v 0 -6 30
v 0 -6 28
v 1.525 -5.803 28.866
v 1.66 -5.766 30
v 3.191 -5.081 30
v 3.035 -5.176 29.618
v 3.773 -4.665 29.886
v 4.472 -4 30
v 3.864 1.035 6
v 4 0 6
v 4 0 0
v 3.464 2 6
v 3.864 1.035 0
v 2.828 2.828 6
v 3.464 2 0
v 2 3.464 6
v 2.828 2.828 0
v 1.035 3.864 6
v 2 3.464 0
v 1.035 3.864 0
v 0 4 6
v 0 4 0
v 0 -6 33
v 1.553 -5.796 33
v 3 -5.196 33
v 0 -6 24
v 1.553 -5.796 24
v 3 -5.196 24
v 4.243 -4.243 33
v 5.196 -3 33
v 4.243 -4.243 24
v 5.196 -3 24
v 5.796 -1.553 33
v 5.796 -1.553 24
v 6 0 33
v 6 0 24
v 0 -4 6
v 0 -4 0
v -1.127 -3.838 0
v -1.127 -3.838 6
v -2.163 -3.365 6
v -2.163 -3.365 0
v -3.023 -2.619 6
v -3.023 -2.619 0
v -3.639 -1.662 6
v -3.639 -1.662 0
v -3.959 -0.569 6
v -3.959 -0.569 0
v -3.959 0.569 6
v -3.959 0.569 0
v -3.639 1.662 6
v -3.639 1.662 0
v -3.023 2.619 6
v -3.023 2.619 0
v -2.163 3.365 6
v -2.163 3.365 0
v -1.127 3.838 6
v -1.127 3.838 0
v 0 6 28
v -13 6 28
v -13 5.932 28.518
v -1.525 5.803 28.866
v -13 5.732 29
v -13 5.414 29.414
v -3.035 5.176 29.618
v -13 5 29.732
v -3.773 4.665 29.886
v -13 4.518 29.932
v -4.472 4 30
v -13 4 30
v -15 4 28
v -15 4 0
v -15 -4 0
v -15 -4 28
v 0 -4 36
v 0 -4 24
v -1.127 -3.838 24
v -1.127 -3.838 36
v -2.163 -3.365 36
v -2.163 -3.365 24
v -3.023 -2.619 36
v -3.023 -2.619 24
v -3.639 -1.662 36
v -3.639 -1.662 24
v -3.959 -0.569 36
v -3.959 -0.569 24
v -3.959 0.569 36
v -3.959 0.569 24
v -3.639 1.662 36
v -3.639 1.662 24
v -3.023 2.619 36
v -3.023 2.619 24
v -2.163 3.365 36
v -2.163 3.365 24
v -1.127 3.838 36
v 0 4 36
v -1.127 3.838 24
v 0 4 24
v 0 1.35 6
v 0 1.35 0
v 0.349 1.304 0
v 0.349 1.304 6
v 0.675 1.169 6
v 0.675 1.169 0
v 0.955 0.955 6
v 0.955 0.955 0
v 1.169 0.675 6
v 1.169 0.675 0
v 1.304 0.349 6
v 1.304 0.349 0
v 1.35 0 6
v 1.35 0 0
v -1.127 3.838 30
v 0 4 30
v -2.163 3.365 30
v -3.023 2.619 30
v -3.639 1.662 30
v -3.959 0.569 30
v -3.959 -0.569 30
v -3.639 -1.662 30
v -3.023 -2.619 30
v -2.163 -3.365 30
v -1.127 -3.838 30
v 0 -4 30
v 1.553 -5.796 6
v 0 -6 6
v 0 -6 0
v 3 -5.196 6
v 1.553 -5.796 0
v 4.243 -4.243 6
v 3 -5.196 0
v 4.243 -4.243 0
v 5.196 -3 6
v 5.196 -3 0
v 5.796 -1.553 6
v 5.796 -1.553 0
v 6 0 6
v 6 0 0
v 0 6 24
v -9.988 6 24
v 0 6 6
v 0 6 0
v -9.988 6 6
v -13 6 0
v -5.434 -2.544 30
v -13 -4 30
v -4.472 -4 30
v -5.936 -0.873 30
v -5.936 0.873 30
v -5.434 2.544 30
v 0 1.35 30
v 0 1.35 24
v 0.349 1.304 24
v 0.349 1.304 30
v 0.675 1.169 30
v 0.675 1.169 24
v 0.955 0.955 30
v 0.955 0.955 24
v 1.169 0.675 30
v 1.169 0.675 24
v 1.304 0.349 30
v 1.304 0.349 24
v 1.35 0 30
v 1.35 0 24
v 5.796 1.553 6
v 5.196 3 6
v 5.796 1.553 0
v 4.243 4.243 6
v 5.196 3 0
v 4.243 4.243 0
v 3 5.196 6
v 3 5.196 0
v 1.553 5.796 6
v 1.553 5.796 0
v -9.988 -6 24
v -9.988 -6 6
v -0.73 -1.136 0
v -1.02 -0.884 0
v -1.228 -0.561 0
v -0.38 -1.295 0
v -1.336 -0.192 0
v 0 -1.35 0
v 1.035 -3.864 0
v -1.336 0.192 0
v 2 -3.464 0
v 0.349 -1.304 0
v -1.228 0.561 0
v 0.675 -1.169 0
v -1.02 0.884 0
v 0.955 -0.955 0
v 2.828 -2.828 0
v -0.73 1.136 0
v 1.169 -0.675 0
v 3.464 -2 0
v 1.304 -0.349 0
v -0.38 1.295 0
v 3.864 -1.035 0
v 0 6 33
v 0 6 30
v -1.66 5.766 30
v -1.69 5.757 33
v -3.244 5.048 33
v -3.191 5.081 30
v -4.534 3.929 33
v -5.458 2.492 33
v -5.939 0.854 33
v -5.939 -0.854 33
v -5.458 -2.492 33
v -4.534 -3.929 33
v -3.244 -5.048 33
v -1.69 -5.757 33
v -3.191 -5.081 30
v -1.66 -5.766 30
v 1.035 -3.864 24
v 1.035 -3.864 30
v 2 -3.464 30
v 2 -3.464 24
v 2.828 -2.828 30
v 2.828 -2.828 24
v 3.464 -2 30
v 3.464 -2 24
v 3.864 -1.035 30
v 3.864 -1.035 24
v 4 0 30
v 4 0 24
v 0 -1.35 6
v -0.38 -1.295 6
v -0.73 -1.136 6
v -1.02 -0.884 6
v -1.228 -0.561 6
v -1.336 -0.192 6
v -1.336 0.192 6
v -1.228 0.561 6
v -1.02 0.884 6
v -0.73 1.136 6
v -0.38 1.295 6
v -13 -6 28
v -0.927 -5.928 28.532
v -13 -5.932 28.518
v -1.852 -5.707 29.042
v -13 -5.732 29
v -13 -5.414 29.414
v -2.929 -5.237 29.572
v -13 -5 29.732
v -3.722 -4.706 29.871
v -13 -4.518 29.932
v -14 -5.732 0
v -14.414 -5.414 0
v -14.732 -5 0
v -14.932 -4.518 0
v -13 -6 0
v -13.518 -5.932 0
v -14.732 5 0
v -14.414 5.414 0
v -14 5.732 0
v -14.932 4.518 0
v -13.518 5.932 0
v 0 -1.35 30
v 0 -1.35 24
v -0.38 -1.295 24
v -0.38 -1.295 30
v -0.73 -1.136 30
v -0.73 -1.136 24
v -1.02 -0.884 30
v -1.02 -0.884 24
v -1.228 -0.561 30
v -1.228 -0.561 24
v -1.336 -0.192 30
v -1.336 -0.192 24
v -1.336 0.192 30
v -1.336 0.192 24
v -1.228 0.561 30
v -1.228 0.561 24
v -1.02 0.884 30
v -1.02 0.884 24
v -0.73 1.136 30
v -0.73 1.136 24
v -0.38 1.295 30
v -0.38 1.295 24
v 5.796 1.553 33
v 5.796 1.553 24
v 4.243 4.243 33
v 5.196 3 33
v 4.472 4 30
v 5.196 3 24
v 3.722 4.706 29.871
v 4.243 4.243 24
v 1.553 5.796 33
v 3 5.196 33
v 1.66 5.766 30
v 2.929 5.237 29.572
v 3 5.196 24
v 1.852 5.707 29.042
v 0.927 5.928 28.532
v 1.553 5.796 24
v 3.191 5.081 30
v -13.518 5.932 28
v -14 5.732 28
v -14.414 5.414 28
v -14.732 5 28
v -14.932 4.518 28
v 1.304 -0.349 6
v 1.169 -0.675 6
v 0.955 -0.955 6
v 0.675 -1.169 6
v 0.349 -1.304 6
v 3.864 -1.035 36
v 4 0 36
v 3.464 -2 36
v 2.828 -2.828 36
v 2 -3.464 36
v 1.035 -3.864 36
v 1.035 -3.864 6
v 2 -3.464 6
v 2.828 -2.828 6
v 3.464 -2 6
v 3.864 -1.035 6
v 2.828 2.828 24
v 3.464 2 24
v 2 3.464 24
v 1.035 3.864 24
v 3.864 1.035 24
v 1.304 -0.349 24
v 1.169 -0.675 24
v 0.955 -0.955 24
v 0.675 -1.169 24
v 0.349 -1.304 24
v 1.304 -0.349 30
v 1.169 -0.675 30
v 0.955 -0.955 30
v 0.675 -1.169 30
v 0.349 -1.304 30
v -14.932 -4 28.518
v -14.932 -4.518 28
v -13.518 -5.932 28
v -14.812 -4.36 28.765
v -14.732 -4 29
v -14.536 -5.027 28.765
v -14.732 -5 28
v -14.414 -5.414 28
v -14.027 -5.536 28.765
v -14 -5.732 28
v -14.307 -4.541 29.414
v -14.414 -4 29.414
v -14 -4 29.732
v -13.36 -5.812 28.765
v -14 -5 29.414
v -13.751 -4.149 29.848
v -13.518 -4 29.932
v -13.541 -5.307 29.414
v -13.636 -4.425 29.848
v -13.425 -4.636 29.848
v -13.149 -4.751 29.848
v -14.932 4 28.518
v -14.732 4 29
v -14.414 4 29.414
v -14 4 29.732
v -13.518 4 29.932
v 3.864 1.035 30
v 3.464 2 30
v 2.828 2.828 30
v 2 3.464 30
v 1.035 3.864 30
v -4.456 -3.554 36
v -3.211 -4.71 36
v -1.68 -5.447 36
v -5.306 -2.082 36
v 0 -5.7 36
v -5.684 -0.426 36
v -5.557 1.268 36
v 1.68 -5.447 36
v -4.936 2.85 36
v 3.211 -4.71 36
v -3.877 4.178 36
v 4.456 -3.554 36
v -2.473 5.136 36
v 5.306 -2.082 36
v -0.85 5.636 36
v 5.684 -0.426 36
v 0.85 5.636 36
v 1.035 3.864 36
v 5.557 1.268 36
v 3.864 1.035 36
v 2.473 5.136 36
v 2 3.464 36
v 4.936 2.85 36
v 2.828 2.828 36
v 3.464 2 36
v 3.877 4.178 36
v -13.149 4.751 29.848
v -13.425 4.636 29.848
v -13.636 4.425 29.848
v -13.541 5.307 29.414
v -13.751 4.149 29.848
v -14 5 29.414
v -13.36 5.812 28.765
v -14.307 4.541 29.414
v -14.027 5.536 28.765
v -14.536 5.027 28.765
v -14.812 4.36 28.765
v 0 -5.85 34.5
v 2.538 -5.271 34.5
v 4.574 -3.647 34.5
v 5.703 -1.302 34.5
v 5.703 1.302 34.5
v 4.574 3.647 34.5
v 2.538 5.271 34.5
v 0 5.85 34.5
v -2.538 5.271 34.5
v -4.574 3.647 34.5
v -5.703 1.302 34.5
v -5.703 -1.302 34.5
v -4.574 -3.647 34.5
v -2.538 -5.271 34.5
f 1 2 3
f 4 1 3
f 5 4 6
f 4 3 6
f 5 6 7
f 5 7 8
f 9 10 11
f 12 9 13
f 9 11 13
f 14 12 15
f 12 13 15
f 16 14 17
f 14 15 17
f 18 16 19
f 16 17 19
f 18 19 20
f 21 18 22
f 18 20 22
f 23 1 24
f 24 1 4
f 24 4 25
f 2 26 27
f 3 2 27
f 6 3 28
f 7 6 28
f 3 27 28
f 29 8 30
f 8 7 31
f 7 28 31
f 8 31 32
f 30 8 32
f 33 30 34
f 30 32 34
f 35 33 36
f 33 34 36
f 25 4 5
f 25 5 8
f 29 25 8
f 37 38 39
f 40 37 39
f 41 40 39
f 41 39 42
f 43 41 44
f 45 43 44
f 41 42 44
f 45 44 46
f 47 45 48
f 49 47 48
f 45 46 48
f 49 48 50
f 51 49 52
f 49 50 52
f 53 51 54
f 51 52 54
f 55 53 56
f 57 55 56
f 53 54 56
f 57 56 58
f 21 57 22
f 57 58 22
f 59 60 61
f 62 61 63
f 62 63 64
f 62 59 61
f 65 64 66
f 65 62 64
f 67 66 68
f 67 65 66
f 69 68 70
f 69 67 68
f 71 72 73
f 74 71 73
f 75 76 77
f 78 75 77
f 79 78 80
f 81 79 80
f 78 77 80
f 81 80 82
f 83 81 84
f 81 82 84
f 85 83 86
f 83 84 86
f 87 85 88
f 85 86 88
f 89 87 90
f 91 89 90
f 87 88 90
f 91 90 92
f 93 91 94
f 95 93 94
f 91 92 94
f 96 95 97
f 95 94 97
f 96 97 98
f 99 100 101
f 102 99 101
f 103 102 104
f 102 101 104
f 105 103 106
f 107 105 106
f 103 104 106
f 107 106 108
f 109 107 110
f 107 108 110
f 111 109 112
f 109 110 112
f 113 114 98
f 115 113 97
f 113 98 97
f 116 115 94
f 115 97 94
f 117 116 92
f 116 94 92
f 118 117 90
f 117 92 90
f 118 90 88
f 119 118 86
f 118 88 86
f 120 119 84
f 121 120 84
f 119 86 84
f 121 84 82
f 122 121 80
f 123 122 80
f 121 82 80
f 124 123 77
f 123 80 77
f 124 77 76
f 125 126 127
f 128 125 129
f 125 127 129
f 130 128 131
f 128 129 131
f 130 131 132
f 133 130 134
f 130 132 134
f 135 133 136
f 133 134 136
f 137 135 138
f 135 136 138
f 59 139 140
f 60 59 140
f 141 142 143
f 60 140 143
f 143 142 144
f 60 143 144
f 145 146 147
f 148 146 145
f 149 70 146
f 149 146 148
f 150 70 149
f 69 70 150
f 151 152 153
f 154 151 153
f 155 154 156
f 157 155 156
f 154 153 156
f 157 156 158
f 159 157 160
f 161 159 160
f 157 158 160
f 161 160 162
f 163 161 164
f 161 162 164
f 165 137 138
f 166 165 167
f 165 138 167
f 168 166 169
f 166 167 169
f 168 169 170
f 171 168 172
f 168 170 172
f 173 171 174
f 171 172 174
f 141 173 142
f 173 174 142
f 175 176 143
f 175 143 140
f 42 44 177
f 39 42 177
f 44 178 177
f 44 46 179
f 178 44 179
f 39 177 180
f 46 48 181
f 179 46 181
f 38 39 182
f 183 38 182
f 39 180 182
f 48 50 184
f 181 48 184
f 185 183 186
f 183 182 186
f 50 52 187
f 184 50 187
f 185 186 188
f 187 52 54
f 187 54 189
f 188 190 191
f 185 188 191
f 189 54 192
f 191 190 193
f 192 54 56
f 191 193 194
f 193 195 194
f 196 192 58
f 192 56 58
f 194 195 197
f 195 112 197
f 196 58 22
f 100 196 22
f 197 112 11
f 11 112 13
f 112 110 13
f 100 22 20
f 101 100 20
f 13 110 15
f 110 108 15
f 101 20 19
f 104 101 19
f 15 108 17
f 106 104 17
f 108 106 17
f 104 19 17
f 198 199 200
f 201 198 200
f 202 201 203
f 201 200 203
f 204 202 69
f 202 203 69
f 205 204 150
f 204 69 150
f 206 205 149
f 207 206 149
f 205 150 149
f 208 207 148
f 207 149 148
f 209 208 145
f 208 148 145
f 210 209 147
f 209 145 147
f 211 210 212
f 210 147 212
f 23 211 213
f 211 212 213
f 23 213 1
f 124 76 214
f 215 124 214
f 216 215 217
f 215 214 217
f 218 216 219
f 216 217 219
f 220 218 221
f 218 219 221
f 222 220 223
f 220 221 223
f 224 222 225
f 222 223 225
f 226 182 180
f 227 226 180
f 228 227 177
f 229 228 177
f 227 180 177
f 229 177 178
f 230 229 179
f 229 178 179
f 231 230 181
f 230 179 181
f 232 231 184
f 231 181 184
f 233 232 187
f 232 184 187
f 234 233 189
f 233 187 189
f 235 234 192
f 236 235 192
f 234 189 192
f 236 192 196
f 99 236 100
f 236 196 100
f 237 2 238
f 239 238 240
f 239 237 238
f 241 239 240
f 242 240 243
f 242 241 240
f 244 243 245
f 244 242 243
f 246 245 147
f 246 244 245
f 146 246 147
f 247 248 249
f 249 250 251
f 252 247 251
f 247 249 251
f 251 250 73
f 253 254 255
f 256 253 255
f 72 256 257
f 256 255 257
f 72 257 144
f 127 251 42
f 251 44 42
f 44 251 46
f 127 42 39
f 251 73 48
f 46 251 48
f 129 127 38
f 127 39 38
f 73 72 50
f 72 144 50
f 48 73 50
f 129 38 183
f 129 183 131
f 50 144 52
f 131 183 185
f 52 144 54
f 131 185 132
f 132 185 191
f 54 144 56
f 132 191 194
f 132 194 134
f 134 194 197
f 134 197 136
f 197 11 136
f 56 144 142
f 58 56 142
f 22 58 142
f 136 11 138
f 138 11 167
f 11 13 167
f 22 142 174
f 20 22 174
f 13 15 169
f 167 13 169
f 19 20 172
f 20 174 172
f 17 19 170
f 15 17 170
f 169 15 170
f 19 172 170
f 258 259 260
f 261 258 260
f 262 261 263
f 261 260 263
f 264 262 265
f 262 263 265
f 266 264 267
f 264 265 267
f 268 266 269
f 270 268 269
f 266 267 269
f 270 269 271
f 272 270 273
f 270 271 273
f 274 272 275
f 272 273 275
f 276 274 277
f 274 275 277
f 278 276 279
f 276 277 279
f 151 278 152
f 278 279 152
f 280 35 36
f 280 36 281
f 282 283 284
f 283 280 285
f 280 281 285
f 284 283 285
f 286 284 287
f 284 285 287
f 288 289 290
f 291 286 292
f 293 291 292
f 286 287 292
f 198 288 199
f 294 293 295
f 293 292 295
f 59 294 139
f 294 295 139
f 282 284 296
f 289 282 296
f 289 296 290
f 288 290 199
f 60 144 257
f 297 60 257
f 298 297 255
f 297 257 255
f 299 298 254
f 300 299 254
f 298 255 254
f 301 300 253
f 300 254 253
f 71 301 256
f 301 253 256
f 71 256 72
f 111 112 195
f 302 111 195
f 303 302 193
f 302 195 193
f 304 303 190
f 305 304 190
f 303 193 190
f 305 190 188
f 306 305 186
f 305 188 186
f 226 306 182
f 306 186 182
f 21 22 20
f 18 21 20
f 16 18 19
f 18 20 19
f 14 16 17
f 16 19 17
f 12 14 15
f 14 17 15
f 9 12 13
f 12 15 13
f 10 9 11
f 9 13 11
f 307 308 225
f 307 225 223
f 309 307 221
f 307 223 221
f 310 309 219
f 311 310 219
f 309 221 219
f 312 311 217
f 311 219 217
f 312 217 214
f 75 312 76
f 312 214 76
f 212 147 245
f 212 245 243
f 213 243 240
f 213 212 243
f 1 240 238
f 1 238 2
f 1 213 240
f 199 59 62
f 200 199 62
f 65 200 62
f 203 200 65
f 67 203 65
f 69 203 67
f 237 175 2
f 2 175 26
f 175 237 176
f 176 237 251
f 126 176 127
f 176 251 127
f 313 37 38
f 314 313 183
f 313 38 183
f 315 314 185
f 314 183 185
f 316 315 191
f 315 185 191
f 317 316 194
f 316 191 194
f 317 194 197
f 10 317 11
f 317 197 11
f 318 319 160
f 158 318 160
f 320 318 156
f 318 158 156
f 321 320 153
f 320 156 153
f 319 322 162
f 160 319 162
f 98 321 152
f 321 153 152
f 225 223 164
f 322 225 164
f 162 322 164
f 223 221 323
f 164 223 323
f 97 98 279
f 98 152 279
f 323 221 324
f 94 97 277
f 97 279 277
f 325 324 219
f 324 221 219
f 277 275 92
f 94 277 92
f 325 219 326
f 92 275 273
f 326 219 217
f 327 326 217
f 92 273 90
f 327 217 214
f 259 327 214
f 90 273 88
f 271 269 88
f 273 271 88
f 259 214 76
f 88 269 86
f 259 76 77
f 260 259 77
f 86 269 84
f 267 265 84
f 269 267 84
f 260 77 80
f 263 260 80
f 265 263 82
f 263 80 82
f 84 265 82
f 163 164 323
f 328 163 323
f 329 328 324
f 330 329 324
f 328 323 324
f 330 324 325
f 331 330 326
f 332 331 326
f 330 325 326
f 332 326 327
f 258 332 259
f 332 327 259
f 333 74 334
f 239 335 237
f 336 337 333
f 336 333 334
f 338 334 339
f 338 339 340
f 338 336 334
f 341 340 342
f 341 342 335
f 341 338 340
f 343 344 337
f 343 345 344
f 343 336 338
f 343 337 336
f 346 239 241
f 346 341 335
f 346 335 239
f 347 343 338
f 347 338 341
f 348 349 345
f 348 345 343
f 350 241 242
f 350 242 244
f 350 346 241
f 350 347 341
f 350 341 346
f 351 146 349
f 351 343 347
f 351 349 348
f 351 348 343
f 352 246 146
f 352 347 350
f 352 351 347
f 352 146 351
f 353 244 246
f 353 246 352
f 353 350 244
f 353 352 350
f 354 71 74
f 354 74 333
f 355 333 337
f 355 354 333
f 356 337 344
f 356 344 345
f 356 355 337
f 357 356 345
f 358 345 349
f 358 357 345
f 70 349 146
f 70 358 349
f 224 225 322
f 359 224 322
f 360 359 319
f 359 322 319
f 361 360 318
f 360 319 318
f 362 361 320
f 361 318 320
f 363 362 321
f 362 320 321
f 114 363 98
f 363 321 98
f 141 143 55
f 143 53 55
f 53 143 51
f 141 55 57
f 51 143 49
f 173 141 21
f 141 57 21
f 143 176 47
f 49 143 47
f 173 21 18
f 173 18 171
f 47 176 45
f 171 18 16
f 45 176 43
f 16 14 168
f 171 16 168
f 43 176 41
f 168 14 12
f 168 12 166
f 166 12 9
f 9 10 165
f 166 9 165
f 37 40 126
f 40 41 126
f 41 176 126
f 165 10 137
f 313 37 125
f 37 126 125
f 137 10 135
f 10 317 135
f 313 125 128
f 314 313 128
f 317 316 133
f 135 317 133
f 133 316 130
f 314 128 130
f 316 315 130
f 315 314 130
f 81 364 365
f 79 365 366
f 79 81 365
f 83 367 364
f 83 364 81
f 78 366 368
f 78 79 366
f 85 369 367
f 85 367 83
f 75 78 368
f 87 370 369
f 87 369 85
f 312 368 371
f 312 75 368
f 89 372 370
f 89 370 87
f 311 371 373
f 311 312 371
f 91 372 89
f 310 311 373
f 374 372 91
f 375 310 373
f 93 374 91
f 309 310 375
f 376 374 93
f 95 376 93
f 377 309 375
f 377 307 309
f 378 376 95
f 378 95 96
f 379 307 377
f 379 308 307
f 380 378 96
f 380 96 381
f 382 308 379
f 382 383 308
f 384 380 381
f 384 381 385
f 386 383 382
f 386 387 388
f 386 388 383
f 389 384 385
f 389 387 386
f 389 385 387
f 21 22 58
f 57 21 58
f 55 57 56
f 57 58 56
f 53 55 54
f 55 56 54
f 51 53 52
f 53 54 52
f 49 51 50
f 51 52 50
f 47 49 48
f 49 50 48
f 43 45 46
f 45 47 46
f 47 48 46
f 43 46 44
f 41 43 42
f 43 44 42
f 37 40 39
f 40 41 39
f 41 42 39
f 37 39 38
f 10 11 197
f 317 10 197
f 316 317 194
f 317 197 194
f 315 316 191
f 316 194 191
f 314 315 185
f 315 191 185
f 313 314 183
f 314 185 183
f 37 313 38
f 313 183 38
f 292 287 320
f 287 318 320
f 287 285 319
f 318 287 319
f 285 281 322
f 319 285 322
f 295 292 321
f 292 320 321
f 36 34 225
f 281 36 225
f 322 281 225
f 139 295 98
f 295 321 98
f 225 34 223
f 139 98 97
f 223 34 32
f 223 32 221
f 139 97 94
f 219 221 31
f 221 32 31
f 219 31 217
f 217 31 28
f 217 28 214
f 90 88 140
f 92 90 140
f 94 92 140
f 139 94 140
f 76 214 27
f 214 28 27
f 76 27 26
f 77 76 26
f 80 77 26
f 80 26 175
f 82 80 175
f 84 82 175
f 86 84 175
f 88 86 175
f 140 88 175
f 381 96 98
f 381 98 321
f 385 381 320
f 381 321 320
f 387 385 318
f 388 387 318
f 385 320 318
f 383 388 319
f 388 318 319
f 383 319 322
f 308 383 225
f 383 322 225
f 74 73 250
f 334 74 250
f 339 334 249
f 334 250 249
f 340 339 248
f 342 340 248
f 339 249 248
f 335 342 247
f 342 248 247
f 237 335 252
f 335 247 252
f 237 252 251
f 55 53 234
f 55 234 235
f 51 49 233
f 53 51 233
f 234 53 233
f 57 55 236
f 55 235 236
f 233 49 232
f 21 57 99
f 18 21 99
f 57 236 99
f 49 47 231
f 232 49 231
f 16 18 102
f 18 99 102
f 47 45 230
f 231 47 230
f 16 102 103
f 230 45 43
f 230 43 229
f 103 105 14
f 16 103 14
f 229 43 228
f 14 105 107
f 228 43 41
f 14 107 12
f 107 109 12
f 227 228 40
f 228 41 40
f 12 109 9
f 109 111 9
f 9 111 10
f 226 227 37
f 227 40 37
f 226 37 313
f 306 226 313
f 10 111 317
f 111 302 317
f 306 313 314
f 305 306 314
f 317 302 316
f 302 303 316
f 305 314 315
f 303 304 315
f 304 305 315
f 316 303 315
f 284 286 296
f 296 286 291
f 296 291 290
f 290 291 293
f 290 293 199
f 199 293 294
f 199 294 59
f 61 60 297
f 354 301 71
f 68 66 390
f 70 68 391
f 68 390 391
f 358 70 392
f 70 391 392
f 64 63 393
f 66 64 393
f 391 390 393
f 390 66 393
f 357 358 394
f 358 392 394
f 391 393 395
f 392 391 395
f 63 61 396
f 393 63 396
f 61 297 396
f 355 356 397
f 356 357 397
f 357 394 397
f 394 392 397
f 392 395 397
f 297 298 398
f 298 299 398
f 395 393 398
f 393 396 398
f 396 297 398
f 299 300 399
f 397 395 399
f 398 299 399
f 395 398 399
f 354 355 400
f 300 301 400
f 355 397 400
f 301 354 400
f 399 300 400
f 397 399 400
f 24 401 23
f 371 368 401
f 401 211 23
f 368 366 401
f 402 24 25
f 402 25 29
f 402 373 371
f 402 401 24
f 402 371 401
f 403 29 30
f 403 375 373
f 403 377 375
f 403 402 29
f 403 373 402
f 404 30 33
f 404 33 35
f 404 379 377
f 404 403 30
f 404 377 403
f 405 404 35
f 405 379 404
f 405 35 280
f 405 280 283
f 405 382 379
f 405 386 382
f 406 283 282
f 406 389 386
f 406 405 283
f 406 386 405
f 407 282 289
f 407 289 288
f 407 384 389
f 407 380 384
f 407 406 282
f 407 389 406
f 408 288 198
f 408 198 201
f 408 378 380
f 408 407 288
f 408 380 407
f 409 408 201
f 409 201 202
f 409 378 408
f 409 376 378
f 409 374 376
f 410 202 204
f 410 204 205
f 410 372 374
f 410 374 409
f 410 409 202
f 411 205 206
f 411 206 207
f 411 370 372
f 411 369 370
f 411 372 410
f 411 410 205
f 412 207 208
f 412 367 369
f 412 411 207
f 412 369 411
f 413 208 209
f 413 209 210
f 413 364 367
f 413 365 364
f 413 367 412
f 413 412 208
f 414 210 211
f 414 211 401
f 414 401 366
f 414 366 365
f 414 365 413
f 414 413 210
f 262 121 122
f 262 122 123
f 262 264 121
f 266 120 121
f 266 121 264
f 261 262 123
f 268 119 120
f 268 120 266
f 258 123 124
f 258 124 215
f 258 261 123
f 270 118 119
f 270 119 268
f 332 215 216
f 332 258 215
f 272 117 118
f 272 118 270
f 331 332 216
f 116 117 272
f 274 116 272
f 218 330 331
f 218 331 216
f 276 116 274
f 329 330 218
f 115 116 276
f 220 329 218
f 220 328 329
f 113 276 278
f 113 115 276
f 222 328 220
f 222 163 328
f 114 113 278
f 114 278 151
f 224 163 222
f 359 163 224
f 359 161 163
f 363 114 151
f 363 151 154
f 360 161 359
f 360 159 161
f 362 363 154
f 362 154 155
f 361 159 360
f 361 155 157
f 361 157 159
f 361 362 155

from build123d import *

# Parameters (mm, degrees)
F4_DEPTH     = 30
F5_DEPTH     = 36
F6_W         = 9.9882828072
F6_H         = 18
F6_W_2       = 6
F7_DEPTH     = 25
F1_DEPTH     = 25
F2_T1_DEPTH  = 8
F2_T6_DEPTH  = 18
F2_S7_R      = 6
F2_T8_DEPTH  = 11
F2_T12_DEPTH = 18
F2_S13_R     = 6
F2_T14_DEPTH = 11
F2_T16_ANGLE = 90
F2_T18_ANGLE = 90


# Not quite as in the source:
# - a fillet or chamfer that OpenCascade refuses, or shapes differently, is made with other operations: its cross-section is extruded or revolved along the edge and cut away or added


with BuildPart() as f4:
    # F3 (on Top) → F4 (new body)
    with BuildSketch(Plane.XY):
        with BuildLine():
            Line((0, 1.35), (0, 4))
            ThreePointArc((0, 4), (-4, 0), (0, -4))
            Line((0, -4), (0, -1.35))
            ThreePointArc((0, -1.35), (-1.35, 0), (0, 1.35))
        make_face()
        with BuildLine():
            ThreePointArc((4, 0), (2.8284271247, 2.8284271247), (0, 4))
            Line((0, 4), (0, 1.35))
            ThreePointArc((0, 1.35), (0.9545941546, 0.9545941546), (1.35, 0))
            ThreePointArc((1.35, 0), (0.9545941546, -0.9545941546), (0, -1.35))
            Line((0, -1.35), (0, -4))
            ThreePointArc((0, -4), (2.8284271247, -2.8284271247), (4, 0))
        make_face()
    extrude(amount=F4_DEPTH)


with BuildPart() as f4b:
    # F3 (on Top) → F4, piece 2 (new body)
    with BuildSketch(Plane.XY):
        with BuildLine():
            ThreePointArc((0, -6), (-6, 0), (0, 6))
            Line((0, 6), (-13, 6))
            ThreePointArc((-13, 6), (-14.4142135624, 5.4142135624), (-15, 4))
            Line((-15, 4), (-15, -4))
            ThreePointArc((-15, -4), (-14.4142135624, -5.4142135624), (-13, -6))
            Line((-13, -6), (0, -6))
        make_face()
    extrude(amount=F4_DEPTH)

    # F3 (on Top) → F5 (join)
    with BuildSketch(Plane.XY):
        with BuildLine():
            Line((0, 4), (0, 6))
            ThreePointArc((0, 6), (-6, 0), (0, -6))
            Line((0, -6), (0, -4))
            ThreePointArc((0, -4), (-4, 0), (0, 4))
        make_face()
        with BuildLine():
            ThreePointArc((0, -6), (4.2426406871, -4.2426406871), (6, 0))
            ThreePointArc((6, 0), (4.2426406871, 4.2426406871), (0, 6))
            Line((0, 6), (0, 4))
            ThreePointArc((0, 4), (2.8284271247, 2.8284271247), (4, 0))
            ThreePointArc((4, 0), (2.8284271247, -2.8284271247), (0, -4))
            Line((0, -4), (0, -6))
        make_face()
    extrude(amount=F5_DEPTH)

    # F0: chamfer of 3 x 0.3 on 1 edges, made by hand

    # F0_s1 → F0_t2 (revolve, cut)
    with BuildSketch(Plane.YZ):
        Polygon((-6, 33), (-5.7, 36), (-6, 36), align=None)
    revolve(axis=Axis((0, 0, 36), (0, 0, 1)), mode=Mode.SUBTRACT)


with BuildPart() as f7_tool:
    # F6 (on face) → F7 (new body)
    with BuildSketch(Plane.XZ.offset(6)):
        with Locations((-4.9941414036, 15)):
            Rectangle(F6_W, F6_H)
        with Locations((3, 15)):
            Rectangle(F6_W_2, F6_H)
    extrude(amount=-F7_DEPTH)


with BuildPart() as f4_1:
    add(f4.part)

    # F7: cut by f7_tool
    add(f7_tool.part, mode=Mode.SUBTRACT)

    # F6 (on face) → F1 (cut)
    with BuildSketch(Plane.XZ.offset(6)):
        with Locations((-4.9941414036, 15)):
            Rectangle(F6_W, F6_H)
        with Locations((3, 15)):
            Rectangle(F6_W_2, F6_H)
    extrude(amount=F1_DEPTH, mode=Mode.SUBTRACT)


with BuildPart() as f4b_1:
    add(f4b.part)

    # F7: cut by f7_tool
    add(f7_tool.part, mode=Mode.SUBTRACT)

    # F2: fillet of radius 2 on 5 edges, made by hand

    # F2_s2 → F2_t1 (cut)
    with BuildSketch(Plane.XZ.offset(-4)):
        with BuildLine():
            ThreePointArc((-15, 28), (-14.4142135624, 29.4142135624), (-13, 30))
            Line((-13, 30), (-15, 30))
            Line((-15, 30), (-15, 28))
        make_face()
    extrude(amount=F2_T1_DEPTH, mode=Mode.SUBTRACT)


with BuildPart() as f2_tool4:
    # F2_s5 → F2_t6 (new body)
    with BuildSketch(Plane.YZ.offset(5)):
        with BuildLine():
            ThreePointArc((6, 28), (5.4142135624, 29.4142135624), (4, 30))
            Line((4, 30), (6, 30))
            Line((6, 30), (6, 28))
        make_face()
    extrude(amount=-F2_T6_DEPTH)

    # F2_s7 → F2_t8 (cut, symmetric)
    with BuildSketch(Plane.XY.offset(29)):
        Circle(F2_S7_R)
    extrude(amount=F2_T8_DEPTH, both=True, mode=Mode.SUBTRACT)


with BuildPart() as f4b_2:
    add(f4b_1.part)

    # F2_t3: cut F2_tool4
    add(f2_tool4.part, mode=Mode.SUBTRACT)


with BuildPart() as f2_tool10:
    # F2_s11 → F2_t12 (new body)
    with BuildSketch(Plane.YZ.offset(-13)):
        with BuildLine():
            ThreePointArc((-6, 28), (-5.4142135624, 29.4142135624), (-4, 30))
            Line((-4, 30), (-6, 30))
            Line((-6, 30), (-6, 28))
        make_face()
    extrude(amount=F2_T12_DEPTH)

    # F2_s13 → F2_t14 (cut, symmetric)
    with BuildSketch(Plane.XY.offset(29)):
        Circle(F2_S13_R)
    extrude(amount=F2_T14_DEPTH, both=True, mode=Mode.SUBTRACT)


with BuildPart() as f4b_3:
    add(f4b_2.part)

    # F2_t9: cut F2_tool10
    add(f2_tool10.part, mode=Mode.SUBTRACT)

    # F2_s15 → F2_t16 (revolve, cut)
    with BuildSketch(Plane.XZ.offset(4)):
        with BuildLine():
            ThreePointArc((-15, 28), (-14.4142135624, 29.4142135624), (-13, 30))
            Line((-13, 30), (-15, 30))
            Line((-15, 30), (-15, 28))
        make_face()
    revolve(axis=Axis((-13, -4, 30), (0, 0, 1)), revolution_arc=F2_T16_ANGLE, mode=Mode.SUBTRACT)

    # F2_s17 → F2_t18 (revolve, cut)
    with BuildSketch(Plane.YZ.offset(-13)):
        with BuildLine():
            ThreePointArc((4, 30), (5.4142135624, 29.4142135624), (6, 28))
            Line((6, 28), (6, 30))
            Line((6, 30), (4, 30))
        make_face()
    revolve(axis=Axis((-13, 4, 30), (0, 0, 1)), revolution_arc=F2_T18_ANGLE, mode=Mode.SUBTRACT)


solid = Compound([f4_1.part, f4b_3.part])
